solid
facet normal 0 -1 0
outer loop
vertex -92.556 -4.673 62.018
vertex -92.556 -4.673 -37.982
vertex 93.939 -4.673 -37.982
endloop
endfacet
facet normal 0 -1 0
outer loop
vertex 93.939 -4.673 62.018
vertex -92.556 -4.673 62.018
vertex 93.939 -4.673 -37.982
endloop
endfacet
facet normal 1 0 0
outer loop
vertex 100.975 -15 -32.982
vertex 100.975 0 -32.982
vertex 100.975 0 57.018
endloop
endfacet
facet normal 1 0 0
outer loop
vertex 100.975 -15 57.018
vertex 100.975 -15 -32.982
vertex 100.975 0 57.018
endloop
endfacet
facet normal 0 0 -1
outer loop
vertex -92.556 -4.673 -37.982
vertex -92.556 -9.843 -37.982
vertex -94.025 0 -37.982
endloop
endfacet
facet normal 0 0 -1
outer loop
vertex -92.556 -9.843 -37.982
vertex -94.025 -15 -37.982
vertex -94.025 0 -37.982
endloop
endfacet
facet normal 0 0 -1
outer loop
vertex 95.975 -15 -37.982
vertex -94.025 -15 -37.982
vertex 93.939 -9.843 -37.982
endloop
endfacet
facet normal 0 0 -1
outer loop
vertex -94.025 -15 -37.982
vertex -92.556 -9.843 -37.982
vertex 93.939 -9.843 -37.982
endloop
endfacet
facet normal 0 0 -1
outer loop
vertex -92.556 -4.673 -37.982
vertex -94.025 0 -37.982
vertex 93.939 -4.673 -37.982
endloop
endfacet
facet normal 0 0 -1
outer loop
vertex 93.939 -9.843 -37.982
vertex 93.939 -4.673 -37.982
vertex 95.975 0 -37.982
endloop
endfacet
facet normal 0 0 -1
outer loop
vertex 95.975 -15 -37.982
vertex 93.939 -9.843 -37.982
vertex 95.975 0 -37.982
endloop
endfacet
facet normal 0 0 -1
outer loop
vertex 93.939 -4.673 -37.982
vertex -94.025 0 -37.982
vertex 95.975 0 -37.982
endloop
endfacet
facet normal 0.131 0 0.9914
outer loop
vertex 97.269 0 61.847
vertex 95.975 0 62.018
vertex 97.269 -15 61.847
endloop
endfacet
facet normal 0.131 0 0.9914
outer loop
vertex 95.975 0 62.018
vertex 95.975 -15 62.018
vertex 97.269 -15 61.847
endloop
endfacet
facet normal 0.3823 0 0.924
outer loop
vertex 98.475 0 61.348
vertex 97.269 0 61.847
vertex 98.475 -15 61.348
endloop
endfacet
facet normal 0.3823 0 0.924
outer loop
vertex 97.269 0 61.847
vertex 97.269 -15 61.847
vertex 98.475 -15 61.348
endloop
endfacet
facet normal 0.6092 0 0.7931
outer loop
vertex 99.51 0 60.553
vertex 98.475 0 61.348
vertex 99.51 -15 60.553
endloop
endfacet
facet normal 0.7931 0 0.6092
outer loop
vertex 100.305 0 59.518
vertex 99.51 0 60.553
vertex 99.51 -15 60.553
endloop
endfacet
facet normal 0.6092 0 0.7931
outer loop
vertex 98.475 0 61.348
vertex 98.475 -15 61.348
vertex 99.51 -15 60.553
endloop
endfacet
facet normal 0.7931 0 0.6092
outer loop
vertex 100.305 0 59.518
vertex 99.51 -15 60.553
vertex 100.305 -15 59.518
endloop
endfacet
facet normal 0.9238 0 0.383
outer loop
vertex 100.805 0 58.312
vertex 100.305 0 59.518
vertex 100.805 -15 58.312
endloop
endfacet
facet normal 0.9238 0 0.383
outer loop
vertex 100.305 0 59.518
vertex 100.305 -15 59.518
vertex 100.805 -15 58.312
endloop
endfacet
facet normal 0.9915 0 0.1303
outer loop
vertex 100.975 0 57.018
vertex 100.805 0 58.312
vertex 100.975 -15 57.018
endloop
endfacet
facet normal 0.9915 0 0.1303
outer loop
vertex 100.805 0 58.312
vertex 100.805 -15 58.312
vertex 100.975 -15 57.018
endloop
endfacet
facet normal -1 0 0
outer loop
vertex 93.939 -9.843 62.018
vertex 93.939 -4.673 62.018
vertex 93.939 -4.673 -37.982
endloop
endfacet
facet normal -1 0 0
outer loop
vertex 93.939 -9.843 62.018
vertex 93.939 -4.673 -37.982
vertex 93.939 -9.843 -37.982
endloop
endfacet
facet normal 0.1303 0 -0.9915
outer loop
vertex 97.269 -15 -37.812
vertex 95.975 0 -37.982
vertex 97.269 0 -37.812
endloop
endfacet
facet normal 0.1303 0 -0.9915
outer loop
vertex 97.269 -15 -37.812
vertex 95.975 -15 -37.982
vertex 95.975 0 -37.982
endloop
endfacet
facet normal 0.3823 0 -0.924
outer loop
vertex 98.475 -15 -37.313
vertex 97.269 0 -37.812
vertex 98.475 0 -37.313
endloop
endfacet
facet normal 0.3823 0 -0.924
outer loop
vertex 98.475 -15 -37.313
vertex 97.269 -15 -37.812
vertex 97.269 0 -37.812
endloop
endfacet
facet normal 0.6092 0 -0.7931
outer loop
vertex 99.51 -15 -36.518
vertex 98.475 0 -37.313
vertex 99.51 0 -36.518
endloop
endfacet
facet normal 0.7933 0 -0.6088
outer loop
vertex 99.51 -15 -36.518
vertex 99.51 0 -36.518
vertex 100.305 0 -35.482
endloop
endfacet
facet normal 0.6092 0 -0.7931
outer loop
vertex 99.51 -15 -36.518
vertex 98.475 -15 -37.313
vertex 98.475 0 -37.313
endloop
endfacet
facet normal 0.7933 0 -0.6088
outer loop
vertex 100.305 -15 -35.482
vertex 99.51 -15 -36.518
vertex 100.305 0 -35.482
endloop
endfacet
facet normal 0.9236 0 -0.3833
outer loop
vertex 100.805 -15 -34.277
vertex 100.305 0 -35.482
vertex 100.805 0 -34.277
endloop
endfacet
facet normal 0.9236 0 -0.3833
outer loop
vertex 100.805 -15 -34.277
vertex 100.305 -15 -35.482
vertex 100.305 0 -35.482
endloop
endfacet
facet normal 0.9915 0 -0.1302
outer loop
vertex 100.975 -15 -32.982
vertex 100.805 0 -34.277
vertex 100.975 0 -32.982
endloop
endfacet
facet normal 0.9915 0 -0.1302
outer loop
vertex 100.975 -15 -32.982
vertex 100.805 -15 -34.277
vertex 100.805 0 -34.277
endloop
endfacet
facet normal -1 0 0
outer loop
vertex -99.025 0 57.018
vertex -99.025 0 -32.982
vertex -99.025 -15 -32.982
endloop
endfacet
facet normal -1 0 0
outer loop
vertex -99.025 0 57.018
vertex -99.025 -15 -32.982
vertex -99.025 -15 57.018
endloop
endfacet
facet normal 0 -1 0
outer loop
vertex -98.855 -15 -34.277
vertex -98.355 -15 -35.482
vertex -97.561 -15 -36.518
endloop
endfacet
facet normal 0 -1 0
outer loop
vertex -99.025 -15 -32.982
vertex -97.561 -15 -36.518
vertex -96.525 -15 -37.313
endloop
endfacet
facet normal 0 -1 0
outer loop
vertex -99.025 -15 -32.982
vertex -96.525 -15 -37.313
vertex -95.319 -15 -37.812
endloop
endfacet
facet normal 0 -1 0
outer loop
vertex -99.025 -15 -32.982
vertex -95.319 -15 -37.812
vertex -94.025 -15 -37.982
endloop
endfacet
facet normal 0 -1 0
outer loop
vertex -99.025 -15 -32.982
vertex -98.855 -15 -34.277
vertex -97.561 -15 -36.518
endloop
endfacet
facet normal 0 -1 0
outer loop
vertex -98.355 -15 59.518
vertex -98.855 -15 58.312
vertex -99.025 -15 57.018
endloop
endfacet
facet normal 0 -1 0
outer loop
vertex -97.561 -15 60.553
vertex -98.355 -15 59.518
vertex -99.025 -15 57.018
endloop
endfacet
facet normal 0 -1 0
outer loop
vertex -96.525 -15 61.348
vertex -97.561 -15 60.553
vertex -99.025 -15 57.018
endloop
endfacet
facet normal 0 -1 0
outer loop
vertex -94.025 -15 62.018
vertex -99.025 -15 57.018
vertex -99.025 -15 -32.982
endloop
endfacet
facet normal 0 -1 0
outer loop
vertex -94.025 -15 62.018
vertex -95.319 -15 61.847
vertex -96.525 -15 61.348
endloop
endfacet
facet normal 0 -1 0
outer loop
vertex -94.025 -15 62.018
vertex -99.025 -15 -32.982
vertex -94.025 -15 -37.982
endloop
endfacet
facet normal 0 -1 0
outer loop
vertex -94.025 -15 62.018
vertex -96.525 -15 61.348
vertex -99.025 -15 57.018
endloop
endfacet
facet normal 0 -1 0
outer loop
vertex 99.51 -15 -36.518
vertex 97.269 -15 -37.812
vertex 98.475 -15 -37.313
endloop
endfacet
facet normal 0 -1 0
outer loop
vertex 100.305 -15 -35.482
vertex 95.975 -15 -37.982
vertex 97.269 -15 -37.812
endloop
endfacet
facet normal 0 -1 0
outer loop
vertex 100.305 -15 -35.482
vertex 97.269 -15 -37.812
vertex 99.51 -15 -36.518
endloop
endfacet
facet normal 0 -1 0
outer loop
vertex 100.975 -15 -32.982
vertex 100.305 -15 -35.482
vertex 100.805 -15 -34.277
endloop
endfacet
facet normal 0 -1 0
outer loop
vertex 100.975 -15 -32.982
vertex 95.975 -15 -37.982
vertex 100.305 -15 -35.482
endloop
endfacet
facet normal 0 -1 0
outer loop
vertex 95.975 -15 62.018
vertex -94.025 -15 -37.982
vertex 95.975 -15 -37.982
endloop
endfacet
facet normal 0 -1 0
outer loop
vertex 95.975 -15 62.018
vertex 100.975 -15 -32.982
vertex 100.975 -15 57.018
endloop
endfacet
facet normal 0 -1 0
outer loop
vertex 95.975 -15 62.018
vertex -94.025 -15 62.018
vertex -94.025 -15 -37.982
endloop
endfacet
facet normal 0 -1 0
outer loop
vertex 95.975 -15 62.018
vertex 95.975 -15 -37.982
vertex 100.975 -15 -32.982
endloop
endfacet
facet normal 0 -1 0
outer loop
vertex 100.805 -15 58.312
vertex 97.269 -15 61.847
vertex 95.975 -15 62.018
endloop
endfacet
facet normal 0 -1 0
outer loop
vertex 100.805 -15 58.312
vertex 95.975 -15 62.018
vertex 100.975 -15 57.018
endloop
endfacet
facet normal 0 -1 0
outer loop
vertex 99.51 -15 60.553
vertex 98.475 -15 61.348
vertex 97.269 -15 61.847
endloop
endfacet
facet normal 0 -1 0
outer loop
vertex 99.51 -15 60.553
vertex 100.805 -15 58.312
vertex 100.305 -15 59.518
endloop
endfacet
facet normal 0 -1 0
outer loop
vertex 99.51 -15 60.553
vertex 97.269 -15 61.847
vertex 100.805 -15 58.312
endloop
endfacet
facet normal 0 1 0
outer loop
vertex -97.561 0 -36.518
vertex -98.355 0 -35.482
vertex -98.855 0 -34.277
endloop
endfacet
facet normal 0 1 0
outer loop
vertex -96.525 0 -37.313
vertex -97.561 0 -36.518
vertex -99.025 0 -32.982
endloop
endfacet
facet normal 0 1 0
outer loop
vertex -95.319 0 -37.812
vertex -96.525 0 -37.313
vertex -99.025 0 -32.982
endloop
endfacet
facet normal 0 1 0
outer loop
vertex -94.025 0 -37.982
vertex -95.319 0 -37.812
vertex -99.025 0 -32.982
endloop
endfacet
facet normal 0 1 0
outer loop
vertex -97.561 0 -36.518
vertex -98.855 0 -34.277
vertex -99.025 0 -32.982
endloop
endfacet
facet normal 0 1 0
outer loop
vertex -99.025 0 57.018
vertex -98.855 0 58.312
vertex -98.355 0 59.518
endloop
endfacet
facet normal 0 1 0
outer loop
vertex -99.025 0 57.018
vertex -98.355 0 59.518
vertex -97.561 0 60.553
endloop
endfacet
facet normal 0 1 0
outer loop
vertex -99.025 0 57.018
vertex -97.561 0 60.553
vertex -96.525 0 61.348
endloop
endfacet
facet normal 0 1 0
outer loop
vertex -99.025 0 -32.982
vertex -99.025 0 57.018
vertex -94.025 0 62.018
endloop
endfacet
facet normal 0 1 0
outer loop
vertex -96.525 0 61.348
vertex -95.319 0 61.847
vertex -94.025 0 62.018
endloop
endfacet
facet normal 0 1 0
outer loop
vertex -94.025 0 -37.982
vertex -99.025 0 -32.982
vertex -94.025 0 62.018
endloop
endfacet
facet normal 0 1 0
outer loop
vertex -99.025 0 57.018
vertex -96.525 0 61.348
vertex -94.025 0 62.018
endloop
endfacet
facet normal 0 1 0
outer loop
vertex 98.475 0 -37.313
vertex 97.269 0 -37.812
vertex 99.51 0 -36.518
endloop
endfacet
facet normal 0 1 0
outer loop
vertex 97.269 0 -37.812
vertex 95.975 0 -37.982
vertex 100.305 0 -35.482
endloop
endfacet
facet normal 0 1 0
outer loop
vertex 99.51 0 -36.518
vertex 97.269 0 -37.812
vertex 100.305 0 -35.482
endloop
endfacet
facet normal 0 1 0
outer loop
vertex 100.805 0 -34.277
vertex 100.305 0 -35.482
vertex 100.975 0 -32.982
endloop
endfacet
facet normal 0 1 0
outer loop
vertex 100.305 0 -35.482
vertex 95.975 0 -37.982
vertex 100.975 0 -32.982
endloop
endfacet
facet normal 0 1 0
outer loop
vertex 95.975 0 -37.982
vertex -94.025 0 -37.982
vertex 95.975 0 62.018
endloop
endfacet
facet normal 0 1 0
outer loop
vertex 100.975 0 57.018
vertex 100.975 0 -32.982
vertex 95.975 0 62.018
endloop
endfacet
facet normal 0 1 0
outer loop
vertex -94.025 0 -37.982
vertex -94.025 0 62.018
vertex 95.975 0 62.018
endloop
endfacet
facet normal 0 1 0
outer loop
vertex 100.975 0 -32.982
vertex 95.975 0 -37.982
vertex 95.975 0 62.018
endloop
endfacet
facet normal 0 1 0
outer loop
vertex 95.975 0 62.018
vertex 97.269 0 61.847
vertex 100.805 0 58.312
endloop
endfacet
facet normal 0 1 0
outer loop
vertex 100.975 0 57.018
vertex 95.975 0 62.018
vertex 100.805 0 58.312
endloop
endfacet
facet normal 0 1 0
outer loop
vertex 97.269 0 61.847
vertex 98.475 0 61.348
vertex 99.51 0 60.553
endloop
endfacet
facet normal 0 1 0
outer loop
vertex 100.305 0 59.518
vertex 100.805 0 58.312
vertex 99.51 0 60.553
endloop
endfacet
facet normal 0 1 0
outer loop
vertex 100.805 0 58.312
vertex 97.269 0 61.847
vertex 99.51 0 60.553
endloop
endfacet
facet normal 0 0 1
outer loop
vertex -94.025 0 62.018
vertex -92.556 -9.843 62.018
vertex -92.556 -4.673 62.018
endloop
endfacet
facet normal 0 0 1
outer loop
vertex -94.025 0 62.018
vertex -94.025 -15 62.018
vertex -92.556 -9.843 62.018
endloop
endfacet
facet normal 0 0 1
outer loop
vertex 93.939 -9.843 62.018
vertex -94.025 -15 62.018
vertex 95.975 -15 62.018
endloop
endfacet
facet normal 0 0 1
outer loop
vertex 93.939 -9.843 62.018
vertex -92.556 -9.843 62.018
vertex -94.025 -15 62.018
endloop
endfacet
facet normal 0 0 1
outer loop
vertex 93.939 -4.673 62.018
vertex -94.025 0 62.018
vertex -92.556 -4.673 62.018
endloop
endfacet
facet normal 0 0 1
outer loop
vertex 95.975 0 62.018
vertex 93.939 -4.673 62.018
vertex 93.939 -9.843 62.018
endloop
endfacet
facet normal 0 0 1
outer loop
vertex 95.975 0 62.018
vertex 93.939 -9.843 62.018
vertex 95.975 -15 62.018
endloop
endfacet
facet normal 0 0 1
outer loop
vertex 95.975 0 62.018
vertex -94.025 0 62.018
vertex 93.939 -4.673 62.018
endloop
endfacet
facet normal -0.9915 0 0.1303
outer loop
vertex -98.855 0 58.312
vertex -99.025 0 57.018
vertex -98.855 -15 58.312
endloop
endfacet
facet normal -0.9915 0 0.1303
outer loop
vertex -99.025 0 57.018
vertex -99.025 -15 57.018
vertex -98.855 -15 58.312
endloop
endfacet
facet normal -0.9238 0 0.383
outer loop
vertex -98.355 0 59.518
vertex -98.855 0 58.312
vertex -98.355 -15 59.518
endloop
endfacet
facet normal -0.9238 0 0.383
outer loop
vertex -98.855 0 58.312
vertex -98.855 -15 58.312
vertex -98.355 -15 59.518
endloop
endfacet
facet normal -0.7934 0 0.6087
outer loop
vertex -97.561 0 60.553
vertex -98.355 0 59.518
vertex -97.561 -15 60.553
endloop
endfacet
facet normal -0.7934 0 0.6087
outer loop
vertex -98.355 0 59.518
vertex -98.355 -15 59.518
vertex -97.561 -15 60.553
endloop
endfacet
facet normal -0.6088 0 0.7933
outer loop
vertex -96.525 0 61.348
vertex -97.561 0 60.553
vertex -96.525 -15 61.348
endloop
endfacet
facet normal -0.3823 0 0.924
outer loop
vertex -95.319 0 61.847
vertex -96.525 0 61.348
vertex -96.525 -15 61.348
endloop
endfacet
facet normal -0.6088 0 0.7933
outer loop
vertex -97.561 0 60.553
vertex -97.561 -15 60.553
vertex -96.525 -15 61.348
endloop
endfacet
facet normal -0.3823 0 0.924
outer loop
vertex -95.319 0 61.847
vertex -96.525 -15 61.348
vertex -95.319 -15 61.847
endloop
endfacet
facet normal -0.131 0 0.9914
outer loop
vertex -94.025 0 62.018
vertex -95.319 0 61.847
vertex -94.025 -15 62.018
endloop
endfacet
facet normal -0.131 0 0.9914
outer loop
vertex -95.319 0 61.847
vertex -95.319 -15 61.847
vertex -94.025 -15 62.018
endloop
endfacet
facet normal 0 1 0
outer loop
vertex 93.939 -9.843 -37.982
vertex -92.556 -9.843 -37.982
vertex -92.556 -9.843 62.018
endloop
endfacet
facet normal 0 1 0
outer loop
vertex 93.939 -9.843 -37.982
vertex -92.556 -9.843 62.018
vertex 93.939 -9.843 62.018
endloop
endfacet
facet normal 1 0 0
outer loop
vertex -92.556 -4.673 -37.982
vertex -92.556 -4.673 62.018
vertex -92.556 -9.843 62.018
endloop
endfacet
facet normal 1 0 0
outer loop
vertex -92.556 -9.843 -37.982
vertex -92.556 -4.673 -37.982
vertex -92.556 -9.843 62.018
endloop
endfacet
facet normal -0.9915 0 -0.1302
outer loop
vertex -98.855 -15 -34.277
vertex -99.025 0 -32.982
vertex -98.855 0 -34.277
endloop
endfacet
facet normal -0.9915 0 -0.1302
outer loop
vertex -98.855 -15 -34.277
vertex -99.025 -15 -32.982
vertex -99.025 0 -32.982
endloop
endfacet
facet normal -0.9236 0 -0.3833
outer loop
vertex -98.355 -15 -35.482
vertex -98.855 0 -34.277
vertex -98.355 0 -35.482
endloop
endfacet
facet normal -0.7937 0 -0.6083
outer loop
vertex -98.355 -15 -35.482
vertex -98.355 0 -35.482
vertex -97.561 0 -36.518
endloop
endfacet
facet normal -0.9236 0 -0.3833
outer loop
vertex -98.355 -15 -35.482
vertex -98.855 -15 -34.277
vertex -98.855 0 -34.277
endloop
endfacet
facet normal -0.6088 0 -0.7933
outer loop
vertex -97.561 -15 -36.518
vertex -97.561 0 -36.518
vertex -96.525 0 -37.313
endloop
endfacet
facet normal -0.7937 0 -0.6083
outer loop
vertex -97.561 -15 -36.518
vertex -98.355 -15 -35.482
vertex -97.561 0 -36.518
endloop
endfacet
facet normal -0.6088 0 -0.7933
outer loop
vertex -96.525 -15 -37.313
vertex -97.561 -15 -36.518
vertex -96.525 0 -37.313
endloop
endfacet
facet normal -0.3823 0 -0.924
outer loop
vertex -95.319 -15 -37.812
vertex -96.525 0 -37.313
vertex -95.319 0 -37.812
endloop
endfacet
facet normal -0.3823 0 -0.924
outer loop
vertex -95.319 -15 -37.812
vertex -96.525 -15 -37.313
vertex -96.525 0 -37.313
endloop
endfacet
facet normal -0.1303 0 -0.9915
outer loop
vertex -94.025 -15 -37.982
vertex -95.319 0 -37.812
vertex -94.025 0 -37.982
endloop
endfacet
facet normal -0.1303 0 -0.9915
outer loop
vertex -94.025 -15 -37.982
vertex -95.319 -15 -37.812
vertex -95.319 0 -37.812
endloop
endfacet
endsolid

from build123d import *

# Parameters (mm, degrees)
F0_W          = 200
F0_H          = 100
F1_DEPTH      = 15
F2_W          = 186.494716
F2_H          = 5.16998
F3_DEPTH      = 25.4
F3_DEPTH_BACK = 187.415063
F4_R          = 5


with BuildPart() as f1:
    # F0 (on Front) → F1 (new body)
    with BuildSketch(Plane.XZ):
        with Locations((0.974886, 12.01759)):
            Rectangle(F0_W, F0_H)
    extrude(amount=F1_DEPTH)

    # F2 (on face) → F3 (cut, two sides)
    with BuildSketch(Plane(origin=(0, 0, -37.98241), x_dir=(1, 0, 0), z_dir=(0, 0, -1))) as f3_sk:
        with Locations((0.691179, 7.258117)):
            Rectangle(F2_W, F2_H)
    extrude(amount=F3_DEPTH, mode=Mode.SUBTRACT)
    extrude(f3_sk.sketch, amount=-F3_DEPTH_BACK, mode=Mode.SUBTRACT)

    # F4
    f4_edges = [f1.edges().sort_by_distance(p)[0] for p in [
        (-99.025114, -7.5, 62.01759),
        (100.974886, -7.5, 62.01759),
        (100.974886, -7.5, -37.98241),
        (-99.025114, -7.5, -37.98241),
    ]]
    fillet(f4_edges, radius=F4_R)


solid = f1.part
